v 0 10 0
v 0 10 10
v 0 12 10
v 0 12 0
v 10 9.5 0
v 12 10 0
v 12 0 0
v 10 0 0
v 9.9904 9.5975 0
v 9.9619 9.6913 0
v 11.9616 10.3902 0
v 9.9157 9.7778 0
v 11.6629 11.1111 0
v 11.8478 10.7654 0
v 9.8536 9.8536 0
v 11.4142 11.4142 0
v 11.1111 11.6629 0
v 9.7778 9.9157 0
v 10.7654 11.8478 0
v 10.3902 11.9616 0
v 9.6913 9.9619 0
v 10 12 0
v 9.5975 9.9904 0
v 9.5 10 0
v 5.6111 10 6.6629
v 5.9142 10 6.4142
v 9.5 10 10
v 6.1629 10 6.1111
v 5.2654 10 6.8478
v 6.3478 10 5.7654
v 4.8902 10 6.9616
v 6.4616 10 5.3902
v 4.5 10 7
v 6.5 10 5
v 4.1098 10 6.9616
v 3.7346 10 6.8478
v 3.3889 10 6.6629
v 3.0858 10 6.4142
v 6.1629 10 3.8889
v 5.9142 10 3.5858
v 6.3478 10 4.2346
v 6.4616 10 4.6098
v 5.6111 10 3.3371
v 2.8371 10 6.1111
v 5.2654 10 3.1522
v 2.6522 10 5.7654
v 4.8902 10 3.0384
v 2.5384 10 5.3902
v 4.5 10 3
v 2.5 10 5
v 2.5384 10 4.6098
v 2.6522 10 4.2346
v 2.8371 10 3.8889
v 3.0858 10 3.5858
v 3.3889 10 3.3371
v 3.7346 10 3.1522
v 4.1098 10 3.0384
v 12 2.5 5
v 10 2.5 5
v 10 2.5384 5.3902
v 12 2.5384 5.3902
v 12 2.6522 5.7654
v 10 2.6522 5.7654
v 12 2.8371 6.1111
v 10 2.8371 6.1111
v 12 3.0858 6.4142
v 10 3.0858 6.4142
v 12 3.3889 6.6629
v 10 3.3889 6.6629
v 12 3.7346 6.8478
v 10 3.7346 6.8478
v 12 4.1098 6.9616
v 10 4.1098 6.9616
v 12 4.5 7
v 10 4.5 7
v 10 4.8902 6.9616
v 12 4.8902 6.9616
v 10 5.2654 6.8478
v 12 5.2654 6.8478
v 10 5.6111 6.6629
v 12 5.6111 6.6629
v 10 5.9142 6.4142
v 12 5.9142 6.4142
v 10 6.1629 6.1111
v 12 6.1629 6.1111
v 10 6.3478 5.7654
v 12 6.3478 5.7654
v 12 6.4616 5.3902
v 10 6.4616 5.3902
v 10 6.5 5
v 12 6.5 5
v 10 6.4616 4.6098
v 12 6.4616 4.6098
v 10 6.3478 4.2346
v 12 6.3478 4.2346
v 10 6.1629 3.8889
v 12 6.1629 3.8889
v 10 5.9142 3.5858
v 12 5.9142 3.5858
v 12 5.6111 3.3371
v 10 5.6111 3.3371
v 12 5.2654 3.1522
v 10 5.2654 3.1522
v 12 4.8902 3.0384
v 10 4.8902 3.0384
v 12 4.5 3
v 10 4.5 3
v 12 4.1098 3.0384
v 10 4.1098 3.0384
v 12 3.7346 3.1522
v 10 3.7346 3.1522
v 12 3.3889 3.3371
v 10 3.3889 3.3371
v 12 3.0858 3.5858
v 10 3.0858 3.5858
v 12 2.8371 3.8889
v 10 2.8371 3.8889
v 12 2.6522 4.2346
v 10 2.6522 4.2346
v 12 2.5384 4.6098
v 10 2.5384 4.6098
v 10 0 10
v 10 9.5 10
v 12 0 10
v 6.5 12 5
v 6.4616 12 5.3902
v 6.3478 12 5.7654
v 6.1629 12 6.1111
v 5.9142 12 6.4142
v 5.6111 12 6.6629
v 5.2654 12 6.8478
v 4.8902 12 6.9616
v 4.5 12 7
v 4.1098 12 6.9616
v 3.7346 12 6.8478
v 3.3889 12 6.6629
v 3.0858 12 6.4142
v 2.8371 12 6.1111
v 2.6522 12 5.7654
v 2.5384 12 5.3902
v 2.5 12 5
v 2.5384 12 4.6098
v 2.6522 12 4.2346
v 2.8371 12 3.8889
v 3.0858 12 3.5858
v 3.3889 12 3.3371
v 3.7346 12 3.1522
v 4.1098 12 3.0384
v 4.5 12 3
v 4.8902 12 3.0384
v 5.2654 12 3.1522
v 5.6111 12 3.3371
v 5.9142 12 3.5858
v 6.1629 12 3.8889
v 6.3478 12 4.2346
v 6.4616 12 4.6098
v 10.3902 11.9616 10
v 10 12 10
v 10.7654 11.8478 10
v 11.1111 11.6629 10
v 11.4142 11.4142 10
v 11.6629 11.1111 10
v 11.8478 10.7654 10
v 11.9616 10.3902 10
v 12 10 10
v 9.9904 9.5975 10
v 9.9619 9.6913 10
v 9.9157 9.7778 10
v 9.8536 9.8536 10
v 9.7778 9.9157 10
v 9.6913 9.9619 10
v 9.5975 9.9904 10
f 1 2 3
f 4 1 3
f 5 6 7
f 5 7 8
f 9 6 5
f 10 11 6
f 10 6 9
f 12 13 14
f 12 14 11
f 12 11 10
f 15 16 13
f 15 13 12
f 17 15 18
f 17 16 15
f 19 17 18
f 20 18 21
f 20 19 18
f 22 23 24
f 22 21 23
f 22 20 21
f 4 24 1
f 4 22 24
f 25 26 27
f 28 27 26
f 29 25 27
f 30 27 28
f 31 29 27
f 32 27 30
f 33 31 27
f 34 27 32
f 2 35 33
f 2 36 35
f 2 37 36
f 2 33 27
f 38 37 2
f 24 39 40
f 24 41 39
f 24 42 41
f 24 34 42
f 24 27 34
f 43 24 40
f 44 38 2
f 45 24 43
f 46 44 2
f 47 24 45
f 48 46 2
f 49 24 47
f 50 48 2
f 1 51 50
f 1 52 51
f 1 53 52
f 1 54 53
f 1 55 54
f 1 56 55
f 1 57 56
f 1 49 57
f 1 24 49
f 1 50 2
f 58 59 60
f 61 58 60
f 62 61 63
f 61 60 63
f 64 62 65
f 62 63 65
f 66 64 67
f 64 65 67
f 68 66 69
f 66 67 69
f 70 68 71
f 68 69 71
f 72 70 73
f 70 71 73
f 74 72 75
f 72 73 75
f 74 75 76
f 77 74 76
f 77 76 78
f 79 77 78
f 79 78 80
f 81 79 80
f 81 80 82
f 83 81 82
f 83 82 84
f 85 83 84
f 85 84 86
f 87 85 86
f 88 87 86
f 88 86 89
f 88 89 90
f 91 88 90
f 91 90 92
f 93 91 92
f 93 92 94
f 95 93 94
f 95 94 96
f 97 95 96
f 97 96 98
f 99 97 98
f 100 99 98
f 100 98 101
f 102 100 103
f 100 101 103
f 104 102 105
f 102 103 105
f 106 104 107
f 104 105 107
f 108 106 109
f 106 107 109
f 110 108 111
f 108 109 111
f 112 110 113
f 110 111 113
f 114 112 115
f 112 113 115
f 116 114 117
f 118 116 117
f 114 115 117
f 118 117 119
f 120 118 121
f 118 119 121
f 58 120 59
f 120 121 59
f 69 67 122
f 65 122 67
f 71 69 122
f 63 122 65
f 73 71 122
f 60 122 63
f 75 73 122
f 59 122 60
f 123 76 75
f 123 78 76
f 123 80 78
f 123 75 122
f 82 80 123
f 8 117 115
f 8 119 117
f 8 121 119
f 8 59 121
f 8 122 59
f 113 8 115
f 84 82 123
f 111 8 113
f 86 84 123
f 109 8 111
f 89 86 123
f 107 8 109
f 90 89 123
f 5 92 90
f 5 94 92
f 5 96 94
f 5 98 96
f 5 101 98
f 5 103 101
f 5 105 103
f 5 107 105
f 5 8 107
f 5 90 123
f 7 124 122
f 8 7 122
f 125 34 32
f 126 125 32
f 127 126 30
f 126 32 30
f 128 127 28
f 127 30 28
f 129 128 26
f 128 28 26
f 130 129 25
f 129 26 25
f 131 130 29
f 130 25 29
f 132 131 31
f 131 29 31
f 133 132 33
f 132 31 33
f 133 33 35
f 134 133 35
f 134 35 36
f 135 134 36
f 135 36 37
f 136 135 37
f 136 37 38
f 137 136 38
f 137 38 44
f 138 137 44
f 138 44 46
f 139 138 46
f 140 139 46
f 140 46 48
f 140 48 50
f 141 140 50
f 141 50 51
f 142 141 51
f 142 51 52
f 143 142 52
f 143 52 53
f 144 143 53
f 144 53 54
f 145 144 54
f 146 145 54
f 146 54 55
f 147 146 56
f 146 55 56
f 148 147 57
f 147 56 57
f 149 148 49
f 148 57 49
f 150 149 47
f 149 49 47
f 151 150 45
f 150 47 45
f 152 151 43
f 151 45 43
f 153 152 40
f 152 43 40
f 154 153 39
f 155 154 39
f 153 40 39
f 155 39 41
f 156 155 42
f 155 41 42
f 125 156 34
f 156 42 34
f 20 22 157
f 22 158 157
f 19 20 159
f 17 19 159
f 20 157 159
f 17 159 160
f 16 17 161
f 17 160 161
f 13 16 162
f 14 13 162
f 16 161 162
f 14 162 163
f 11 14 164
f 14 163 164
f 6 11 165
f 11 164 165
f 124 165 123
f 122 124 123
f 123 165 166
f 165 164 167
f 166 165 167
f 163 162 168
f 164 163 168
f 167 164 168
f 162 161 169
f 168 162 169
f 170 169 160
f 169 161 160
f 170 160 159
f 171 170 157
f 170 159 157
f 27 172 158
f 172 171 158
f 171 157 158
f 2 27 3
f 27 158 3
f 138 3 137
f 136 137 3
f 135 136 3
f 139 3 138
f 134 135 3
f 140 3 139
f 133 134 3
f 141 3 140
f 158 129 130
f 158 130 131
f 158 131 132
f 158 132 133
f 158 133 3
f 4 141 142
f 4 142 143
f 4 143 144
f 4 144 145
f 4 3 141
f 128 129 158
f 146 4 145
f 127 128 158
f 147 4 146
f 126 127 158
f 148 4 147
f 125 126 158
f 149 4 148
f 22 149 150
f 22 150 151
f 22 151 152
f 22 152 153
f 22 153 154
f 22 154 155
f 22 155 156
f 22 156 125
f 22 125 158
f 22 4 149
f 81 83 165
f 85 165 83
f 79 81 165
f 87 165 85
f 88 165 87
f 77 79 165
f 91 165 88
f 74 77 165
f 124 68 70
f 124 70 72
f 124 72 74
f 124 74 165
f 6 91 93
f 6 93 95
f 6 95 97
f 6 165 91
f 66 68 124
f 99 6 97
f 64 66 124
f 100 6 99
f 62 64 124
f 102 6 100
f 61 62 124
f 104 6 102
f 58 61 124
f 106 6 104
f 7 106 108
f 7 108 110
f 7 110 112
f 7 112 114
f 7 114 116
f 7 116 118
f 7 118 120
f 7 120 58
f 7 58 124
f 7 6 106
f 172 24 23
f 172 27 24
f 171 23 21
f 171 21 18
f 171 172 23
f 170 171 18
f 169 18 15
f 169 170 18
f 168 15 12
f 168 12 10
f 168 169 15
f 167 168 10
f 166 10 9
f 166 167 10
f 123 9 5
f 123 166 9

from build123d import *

# Parameters (mm, degrees)
BOSS_EXTRU_2_DEPTH      = 10
ENL_V_MAT_EXTRU_1_REACH = 20.547
ESQUISSE3_R             = 2
ENL_V_MAT_EXTRU_2_REACH = 20.547
ESQUISSE4_R             = 2
CONG_1_R                = 2
CONG_2_R                = 0.5


with BuildPart() as part:
    # Esquisse2 → Boss.-Extru.2 (new body)
    with BuildSketch(Plane.XY):
        Polygon((0, 12), (12, 12), (12, 0), (10, 0), (10, 10), (0, 10), align=None)
    extrude(amount=BOSS_EXTRU_2_DEPTH)

    # Esquisse3 → Enlèv. mat.-Extru.1 (cut, up to next)
    with BuildSketch(Plane.ZY.offset(-10), mode=Mode.PRIVATE) as enl_v_mat_extru_1_sk1:
        with Locations(Location((5, 4.5, 0), (0, 0, 270))):
            Circle(ESQUISSE3_R)
    enl_v_mat_extru_1_tool1 = extrude(enl_v_mat_extru_1_sk1.sketch, amount=-ENL_V_MAT_EXTRU_1_REACH, mode=Mode.PRIVATE) & part.part
    add(enl_v_mat_extru_1_tool1.solids().sort_by_distance((10, 4.5, 5))[0], mode=Mode.SUBTRACT)

    # Esquisse4 → Enlèv. mat.-Extru.2 (cut, up to next)
    with BuildSketch(Plane.XZ.offset(-10), mode=Mode.PRIVATE) as enl_v_mat_extru_2_sk1:
        with Locations((4.5, 5)):
            Circle(ESQUISSE4_R)
    enl_v_mat_extru_2_tool1 = extrude(enl_v_mat_extru_2_sk1.sketch, amount=-ENL_V_MAT_EXTRU_2_REACH, mode=Mode.PRIVATE) & part.part
    add(enl_v_mat_extru_2_tool1.solids().sort_by_distance((4.5, 10, 5))[0], mode=Mode.SUBTRACT)

    # Congé1
    cong_1_edges = [part.edges().sort_by_distance(p)[0] for p in [
        (12, 12, 5),
    ]]
    fillet(cong_1_edges, radius=CONG_1_R)

    # Congé2
    cong_2_edges = [part.edges().sort_by_distance(p)[0] for p in [
        (10, 10, 5),
    ]]
    fillet(cong_2_edges, radius=CONG_2_R)


solid = part.part
